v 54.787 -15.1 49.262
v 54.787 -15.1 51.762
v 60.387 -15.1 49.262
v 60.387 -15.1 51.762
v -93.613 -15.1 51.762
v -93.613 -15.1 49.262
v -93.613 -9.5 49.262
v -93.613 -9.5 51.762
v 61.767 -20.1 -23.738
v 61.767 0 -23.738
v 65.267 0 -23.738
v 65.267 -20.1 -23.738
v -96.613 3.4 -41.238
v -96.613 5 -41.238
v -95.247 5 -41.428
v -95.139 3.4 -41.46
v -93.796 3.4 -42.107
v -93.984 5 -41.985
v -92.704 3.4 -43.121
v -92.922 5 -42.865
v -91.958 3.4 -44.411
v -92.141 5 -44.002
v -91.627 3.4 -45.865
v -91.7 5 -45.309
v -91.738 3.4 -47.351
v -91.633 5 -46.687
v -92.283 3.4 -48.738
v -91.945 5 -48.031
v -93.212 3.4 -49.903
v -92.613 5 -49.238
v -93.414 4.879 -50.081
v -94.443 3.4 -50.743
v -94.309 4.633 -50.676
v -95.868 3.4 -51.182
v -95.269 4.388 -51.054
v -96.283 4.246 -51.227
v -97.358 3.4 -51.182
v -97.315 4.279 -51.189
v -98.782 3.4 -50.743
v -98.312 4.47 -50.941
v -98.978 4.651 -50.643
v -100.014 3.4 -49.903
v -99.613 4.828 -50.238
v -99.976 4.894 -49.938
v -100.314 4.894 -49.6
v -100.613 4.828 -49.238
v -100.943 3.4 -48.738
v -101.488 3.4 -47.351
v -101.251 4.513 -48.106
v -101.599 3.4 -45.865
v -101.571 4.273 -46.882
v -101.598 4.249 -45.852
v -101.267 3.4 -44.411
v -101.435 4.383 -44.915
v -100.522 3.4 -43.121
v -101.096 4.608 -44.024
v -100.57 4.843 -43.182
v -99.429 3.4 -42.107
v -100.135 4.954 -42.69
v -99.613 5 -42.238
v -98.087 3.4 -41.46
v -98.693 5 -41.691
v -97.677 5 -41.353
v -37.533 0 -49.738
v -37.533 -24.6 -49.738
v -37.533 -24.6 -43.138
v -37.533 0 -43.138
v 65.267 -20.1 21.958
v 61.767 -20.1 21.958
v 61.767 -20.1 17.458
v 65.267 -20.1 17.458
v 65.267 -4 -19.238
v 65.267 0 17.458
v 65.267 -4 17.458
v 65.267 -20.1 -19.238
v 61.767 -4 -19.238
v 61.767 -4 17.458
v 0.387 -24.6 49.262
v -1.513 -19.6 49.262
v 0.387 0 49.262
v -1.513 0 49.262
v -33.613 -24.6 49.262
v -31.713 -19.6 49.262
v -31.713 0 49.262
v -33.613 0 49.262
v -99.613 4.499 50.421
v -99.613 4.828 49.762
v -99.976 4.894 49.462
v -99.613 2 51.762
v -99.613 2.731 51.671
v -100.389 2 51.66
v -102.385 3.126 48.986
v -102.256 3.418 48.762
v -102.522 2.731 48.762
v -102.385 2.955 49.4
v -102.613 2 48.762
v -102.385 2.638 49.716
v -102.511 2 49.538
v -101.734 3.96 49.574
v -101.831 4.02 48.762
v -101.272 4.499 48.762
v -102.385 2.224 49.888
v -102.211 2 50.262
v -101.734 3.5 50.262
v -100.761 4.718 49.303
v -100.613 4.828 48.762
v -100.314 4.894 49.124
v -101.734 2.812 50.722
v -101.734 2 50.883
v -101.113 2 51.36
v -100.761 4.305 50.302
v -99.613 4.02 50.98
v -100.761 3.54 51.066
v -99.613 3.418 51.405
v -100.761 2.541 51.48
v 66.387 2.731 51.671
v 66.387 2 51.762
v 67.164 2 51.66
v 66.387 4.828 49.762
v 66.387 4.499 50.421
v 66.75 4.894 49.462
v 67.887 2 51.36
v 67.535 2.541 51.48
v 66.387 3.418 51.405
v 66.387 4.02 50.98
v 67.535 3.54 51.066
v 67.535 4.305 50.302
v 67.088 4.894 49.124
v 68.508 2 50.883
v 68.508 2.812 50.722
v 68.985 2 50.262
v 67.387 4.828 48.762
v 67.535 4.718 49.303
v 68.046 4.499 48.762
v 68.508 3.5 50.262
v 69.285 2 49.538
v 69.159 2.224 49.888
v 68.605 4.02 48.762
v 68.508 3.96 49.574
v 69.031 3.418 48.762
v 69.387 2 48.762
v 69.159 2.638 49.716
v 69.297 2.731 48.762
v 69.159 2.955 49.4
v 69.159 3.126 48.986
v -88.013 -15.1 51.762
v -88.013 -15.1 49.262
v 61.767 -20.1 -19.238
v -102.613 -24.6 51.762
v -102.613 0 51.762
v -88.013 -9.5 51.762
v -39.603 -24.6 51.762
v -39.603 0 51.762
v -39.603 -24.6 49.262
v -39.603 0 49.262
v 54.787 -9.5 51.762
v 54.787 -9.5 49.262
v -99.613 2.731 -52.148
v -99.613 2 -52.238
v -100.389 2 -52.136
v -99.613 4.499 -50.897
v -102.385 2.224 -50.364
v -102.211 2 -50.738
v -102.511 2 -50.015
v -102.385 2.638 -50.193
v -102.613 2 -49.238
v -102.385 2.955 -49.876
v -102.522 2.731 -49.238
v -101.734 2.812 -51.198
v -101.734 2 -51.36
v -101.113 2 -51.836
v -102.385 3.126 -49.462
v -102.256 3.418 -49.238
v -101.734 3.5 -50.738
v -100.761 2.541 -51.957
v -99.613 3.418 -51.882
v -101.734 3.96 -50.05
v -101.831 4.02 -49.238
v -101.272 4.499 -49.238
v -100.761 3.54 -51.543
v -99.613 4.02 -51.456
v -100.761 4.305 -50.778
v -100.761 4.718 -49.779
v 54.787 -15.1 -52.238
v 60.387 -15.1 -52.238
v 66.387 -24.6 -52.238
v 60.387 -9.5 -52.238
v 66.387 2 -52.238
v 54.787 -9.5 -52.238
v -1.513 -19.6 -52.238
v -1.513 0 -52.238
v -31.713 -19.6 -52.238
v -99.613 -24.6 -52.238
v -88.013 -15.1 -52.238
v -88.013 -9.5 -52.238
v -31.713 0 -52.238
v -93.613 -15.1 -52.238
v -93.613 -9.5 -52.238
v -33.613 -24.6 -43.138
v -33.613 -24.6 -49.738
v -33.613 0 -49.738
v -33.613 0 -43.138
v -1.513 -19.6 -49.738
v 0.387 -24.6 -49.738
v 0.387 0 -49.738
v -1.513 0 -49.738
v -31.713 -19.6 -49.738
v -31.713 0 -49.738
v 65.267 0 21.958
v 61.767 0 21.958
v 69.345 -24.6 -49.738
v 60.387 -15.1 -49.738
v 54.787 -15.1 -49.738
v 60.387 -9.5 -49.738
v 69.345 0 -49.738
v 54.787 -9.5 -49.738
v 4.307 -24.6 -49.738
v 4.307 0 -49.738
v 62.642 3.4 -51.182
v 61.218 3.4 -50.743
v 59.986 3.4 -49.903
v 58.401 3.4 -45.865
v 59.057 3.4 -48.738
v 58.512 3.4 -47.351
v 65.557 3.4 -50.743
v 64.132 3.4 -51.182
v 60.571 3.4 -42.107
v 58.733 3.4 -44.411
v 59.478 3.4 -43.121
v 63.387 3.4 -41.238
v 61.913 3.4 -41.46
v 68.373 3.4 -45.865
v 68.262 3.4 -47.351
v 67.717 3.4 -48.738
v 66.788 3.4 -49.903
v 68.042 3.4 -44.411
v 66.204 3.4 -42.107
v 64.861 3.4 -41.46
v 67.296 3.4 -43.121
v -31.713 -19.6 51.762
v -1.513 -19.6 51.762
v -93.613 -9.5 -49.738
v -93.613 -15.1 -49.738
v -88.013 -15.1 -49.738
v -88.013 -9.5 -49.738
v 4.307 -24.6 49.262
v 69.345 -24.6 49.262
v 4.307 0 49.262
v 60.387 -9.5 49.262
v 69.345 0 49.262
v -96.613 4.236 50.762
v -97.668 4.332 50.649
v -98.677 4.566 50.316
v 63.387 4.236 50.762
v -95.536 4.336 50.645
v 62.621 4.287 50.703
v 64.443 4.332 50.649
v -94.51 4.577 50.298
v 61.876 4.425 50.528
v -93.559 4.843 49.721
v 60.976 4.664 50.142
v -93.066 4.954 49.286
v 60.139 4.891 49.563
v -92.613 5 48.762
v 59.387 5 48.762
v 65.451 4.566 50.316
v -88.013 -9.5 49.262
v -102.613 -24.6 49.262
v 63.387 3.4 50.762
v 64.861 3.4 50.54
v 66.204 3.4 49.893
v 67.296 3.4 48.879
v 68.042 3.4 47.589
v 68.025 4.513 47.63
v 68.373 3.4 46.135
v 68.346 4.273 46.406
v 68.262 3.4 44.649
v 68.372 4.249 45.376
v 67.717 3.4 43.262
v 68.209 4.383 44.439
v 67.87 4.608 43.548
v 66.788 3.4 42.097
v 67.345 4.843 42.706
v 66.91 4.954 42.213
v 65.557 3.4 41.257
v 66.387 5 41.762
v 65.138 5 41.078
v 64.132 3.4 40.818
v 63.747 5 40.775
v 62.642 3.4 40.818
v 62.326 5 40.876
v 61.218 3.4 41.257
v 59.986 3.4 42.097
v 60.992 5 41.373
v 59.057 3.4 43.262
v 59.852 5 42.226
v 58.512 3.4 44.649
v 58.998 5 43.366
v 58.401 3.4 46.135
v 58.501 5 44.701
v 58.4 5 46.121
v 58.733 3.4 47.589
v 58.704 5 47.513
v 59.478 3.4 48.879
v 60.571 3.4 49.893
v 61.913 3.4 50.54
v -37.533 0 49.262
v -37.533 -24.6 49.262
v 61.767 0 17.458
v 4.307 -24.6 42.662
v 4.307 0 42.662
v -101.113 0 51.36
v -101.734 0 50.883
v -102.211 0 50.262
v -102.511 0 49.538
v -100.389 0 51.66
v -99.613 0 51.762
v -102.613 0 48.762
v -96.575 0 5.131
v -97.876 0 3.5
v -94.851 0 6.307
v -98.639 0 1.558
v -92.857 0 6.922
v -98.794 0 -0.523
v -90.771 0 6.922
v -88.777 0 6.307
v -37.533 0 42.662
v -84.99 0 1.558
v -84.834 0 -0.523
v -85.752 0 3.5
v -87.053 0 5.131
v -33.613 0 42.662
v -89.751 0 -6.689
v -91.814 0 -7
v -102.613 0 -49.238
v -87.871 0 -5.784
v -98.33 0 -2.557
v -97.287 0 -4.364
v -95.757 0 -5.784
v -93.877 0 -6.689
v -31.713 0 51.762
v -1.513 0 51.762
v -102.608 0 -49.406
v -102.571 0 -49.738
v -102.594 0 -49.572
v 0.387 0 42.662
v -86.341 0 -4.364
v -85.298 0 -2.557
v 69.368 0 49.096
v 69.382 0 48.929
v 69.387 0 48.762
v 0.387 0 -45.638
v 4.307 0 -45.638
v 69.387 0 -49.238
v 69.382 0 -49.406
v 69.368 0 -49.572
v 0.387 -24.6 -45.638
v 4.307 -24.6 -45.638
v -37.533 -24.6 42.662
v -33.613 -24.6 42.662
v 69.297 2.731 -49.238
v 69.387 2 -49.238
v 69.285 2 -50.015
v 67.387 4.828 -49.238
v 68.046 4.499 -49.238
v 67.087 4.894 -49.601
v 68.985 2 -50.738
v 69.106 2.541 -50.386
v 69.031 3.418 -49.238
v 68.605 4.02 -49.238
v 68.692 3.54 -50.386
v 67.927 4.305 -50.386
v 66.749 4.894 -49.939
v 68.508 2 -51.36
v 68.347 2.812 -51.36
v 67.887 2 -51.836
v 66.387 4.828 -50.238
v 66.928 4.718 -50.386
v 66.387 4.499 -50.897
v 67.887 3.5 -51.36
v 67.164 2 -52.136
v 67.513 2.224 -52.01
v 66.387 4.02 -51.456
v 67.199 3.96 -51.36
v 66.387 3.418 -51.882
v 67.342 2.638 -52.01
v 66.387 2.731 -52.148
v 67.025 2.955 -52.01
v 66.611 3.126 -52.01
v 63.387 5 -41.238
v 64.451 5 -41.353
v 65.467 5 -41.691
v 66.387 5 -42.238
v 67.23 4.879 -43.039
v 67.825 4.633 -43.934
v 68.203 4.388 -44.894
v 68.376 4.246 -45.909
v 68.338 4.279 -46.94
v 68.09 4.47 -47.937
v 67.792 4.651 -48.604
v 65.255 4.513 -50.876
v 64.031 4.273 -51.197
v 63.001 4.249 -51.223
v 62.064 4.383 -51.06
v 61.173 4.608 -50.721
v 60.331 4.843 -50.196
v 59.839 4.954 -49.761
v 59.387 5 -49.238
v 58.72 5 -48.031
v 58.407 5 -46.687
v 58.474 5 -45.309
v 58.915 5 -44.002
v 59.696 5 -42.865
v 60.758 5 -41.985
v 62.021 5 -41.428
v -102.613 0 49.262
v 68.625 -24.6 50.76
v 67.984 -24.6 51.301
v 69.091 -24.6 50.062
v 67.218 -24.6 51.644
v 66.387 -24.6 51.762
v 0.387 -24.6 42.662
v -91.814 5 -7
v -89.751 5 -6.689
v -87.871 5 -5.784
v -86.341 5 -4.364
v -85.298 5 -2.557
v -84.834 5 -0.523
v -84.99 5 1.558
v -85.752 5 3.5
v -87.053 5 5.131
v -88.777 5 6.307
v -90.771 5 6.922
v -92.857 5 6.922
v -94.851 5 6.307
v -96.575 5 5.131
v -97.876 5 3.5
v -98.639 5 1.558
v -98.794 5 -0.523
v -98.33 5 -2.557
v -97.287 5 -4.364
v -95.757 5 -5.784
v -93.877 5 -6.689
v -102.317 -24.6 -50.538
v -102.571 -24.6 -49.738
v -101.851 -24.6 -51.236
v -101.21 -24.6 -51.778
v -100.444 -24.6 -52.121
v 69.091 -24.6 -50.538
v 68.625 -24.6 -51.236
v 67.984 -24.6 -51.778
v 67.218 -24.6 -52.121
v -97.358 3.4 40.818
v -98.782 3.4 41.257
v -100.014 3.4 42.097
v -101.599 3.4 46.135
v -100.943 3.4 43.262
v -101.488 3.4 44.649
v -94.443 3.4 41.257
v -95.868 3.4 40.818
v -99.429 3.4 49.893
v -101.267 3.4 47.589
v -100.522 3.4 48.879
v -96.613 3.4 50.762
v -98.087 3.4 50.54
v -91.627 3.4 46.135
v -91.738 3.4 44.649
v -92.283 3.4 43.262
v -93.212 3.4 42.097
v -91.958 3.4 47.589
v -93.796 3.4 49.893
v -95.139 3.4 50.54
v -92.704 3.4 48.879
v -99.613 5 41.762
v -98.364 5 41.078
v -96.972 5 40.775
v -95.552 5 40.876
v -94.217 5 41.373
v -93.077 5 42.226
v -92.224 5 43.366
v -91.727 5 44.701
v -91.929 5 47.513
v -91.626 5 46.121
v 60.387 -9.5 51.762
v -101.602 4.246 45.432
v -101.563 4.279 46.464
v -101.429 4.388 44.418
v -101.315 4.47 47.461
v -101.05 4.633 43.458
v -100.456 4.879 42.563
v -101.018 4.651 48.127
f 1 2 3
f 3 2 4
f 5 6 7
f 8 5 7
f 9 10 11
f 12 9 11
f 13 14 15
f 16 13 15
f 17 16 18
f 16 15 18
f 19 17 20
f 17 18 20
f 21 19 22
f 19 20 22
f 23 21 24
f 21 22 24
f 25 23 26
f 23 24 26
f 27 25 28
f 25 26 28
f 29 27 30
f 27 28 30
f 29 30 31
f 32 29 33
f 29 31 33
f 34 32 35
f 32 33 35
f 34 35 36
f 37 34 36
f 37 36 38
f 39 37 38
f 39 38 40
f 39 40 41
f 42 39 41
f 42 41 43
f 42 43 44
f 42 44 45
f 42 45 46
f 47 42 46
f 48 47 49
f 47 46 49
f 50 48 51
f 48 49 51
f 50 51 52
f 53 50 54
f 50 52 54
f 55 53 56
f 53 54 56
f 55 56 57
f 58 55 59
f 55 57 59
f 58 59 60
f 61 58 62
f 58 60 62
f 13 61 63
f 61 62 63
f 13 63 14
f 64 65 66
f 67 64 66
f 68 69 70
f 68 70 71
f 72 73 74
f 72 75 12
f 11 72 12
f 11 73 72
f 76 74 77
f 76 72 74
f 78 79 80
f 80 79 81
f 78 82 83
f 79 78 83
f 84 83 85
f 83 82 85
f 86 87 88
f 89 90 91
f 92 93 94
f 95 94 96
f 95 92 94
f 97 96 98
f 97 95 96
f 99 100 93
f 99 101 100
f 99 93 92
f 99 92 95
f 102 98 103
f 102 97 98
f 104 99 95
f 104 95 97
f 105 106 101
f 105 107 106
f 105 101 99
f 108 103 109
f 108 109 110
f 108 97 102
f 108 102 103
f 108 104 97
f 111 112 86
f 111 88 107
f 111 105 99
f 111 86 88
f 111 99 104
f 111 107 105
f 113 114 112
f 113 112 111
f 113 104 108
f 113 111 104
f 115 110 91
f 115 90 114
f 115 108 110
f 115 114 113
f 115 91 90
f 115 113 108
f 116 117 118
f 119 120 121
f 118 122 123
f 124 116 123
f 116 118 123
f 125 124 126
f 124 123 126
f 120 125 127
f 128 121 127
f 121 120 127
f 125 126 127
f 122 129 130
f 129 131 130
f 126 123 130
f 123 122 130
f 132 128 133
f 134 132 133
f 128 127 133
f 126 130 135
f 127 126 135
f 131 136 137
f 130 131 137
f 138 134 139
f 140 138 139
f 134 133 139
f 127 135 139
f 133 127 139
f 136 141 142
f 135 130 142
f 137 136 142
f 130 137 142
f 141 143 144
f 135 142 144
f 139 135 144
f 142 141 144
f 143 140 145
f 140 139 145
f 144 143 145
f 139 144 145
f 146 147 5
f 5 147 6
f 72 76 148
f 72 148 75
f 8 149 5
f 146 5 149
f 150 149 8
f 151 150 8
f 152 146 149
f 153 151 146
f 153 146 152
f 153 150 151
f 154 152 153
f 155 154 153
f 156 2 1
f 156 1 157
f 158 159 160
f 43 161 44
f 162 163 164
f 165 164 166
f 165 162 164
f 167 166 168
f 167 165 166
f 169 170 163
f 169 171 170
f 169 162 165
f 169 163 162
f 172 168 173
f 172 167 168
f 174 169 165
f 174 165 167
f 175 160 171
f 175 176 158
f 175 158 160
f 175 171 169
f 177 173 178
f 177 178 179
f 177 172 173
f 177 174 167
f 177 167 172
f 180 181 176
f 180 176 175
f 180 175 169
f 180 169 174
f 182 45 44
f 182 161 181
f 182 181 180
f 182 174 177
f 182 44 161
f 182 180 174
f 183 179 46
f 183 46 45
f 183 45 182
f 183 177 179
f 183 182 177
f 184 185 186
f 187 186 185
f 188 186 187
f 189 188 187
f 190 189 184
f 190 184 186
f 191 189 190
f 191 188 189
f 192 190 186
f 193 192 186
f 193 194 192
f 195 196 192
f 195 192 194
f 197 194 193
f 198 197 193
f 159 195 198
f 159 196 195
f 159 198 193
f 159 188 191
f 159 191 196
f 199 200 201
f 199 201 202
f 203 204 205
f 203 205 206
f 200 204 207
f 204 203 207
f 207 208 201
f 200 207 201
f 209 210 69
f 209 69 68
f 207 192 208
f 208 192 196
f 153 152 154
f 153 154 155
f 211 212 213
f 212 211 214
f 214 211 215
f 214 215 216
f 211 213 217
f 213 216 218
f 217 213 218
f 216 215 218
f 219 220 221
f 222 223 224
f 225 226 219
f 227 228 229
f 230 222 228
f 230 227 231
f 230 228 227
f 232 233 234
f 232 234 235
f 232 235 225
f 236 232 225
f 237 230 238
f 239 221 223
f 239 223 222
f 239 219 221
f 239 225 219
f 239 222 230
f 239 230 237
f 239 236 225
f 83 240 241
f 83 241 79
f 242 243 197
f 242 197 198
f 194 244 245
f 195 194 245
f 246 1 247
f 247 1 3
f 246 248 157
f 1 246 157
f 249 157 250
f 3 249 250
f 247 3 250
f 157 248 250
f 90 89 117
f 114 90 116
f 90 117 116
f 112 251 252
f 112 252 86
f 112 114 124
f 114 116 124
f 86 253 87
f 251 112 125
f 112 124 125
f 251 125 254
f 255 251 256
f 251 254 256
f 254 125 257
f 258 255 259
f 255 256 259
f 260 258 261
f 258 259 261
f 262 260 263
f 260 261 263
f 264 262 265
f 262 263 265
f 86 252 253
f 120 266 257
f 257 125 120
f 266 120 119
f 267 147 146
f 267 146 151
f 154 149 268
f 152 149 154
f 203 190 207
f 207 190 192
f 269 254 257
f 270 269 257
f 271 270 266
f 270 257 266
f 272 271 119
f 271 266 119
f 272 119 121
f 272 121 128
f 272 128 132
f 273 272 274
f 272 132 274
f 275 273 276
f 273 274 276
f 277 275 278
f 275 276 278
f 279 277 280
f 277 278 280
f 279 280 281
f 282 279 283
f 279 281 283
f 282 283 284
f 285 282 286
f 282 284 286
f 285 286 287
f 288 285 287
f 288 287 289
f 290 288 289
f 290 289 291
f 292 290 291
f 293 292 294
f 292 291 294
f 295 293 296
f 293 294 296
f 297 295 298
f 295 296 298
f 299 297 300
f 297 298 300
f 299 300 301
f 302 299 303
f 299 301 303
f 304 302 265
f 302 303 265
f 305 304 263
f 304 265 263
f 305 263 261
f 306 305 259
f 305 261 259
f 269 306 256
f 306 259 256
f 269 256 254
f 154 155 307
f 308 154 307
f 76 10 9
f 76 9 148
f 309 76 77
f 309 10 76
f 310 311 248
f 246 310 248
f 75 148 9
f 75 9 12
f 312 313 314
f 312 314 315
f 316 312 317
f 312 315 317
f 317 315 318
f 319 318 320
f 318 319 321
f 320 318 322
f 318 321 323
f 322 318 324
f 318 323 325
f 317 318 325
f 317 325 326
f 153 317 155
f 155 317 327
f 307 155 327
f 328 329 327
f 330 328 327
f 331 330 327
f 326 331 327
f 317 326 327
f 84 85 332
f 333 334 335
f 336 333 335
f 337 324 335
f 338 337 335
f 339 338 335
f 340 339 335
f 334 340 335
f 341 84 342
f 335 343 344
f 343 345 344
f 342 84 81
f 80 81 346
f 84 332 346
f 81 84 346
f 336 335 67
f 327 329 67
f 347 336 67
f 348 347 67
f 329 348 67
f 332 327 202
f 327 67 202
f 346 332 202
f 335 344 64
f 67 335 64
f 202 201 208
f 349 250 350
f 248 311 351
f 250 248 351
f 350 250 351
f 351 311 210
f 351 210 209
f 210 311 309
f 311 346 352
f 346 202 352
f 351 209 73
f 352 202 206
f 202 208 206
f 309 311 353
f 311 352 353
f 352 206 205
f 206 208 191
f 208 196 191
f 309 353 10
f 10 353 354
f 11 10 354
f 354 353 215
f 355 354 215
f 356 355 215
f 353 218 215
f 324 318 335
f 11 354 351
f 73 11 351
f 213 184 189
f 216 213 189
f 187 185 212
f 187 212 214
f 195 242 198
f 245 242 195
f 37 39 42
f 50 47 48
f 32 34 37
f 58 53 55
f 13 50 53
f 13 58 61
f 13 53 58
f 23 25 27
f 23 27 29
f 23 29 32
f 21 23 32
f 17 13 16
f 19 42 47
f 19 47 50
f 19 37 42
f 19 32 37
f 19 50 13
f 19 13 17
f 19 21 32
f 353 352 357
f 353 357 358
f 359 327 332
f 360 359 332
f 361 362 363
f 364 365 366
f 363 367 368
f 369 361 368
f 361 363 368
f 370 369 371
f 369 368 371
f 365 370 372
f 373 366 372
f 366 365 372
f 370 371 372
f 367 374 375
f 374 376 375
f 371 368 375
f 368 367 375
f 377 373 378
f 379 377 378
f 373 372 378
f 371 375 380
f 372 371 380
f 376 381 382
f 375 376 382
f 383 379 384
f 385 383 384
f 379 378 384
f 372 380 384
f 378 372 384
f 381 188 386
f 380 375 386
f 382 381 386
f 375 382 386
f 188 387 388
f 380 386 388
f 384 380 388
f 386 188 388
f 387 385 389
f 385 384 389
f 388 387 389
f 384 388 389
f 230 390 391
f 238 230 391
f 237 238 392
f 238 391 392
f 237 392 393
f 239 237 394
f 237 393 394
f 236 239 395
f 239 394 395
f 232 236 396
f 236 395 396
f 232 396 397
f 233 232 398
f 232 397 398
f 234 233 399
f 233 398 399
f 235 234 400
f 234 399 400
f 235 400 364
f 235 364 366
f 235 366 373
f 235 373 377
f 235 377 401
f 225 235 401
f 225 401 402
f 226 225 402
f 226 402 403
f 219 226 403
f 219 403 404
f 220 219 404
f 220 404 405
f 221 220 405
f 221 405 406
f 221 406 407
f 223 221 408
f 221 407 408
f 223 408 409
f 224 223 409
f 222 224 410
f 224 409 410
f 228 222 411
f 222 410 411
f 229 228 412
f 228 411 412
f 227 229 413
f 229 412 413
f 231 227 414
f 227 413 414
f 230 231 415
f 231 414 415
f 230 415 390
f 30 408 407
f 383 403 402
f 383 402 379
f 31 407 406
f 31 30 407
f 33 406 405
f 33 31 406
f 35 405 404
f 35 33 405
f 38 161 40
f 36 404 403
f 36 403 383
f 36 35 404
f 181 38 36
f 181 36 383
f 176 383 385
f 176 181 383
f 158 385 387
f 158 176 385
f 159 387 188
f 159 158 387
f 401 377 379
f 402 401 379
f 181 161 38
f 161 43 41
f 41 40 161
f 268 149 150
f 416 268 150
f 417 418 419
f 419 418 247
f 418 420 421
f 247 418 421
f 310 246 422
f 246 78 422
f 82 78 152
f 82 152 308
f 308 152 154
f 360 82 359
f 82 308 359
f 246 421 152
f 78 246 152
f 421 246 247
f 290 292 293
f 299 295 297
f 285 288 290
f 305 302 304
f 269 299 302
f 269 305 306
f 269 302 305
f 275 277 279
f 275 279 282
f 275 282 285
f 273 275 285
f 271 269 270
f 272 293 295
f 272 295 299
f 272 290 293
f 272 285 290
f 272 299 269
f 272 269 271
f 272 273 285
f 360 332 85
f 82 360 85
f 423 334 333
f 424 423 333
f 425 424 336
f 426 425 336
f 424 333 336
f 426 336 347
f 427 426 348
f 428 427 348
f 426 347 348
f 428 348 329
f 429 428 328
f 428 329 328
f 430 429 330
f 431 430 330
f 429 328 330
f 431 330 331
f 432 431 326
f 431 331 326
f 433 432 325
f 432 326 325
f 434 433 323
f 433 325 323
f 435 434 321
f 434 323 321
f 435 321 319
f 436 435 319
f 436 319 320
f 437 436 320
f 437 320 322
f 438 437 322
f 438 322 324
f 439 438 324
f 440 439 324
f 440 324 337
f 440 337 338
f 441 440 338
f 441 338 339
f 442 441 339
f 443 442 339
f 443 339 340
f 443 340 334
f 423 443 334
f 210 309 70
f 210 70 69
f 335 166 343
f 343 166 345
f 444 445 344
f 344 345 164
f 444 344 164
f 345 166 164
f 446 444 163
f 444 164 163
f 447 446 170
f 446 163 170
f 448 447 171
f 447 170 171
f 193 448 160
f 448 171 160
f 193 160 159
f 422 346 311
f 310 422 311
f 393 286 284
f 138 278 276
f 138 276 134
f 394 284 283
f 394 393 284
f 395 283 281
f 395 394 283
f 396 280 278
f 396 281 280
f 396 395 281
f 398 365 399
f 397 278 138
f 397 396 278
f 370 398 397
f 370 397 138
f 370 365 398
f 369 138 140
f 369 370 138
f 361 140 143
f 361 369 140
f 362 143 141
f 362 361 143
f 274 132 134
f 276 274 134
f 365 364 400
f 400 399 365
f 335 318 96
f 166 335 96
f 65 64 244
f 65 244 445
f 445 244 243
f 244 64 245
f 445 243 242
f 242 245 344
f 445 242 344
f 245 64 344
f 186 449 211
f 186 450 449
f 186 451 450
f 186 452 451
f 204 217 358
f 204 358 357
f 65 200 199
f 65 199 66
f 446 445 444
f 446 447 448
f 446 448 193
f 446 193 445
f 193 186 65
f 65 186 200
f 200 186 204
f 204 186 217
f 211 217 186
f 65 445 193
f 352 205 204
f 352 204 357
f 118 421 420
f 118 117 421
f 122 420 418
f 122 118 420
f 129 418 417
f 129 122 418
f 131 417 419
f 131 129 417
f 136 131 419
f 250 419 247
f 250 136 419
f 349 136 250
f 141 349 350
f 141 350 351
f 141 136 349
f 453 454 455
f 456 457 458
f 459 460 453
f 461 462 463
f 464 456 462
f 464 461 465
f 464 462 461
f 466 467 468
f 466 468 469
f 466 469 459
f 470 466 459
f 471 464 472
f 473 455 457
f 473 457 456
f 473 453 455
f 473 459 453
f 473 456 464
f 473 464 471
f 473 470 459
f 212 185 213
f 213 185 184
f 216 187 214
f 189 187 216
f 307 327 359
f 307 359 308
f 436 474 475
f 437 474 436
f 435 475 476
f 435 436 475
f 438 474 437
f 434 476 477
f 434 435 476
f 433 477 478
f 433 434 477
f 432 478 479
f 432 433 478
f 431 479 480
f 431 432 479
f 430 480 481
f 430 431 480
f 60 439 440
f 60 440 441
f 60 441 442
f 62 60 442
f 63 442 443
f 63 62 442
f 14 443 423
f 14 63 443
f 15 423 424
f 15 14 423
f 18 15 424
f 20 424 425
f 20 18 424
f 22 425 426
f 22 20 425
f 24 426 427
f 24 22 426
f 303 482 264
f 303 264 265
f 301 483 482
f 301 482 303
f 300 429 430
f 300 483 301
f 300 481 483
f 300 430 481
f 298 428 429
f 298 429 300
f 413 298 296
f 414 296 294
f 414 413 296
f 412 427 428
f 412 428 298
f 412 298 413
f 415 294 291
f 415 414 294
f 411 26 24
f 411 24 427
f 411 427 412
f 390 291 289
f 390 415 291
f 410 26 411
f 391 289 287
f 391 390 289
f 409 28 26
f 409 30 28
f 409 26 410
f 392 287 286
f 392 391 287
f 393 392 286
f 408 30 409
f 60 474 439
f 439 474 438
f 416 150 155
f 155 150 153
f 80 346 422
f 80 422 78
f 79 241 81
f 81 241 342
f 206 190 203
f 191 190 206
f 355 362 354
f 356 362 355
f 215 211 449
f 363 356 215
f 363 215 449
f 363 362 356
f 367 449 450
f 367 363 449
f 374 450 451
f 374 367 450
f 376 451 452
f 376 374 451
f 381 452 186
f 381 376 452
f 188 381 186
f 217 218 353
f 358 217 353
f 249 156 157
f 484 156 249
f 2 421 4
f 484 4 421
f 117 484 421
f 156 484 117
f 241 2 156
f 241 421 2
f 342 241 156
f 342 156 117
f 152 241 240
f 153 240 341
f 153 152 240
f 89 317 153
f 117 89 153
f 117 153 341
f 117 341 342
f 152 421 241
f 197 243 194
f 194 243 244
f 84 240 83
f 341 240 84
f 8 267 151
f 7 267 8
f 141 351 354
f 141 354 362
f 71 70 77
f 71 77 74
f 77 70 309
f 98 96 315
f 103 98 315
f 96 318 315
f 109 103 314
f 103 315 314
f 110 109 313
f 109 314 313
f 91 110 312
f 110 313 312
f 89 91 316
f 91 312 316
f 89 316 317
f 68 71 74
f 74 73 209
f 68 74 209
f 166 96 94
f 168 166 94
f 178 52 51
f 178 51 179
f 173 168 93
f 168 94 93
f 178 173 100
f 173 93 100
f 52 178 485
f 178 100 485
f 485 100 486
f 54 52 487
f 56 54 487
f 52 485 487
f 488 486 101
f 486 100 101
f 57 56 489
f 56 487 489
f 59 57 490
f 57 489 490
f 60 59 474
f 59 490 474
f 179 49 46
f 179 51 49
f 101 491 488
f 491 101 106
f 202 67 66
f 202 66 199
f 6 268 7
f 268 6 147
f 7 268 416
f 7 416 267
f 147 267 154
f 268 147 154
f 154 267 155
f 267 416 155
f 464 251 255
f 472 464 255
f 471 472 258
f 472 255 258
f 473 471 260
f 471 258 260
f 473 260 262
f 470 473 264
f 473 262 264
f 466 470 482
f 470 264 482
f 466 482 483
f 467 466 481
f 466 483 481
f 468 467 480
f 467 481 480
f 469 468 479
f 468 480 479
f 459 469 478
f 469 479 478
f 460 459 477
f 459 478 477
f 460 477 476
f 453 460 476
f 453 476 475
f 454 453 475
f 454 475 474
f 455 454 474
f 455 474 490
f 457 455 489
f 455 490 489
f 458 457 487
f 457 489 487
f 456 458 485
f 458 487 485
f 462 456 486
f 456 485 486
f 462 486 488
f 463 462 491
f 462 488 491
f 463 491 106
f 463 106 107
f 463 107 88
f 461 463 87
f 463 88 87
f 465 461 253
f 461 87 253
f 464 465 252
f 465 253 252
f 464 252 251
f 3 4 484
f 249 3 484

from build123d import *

# Parameters (mm, degrees)
ESBO_O1_W                 = 172
ESBO_O1_H                 = 104
RESSALTO_EXTRUS_O1_DEPTH  = 5
ESBO_O6_W                 = 63.01
ESBO_O6_H                 = 24.6
RESSALTO_EXTRUS_O3_DEPTH  = 2.5
ESBO_O9_W                 = 5.6
ESBO_O9_H                 = 5.6
CORTE_EXTRUS_O1_DEPTH     = 5
ESBO_O10_W                = 63
ESBO_O10_H                = 24.6
RESSALTO_EXTRUS_O4_DEPTH  = 2.5
ESBO_O11_W                = 5.6
ESBO_O11_H                = 5.6
CORTE_EXTRUS_O2_DEPTH     = 5
ESBO_O12_W                = 63
ESBO_O12_H                = 24.6
RESSALTO_EXTRUS_O5_DEPTH  = 2.5
ESBO_O15_W                = 63
ESBO_O15_H                = 24.6
RESSALTO_EXTRUS_O6_DEPTH  = 2.5
ESBO_O18_W                = 5.6
ESBO_O18_H                = 5.6
CORTE_EXTRUS_O5_DEPTH     = 10
ESBO_O19_W                = 5.6
ESBO_O19_H                = 5.6
CORTE_EXTRUS_O6_DEPTH     = 10
ESBO_O20_W                = 7.9
ESBO_O20_H                = 24.6
RESSALTO_EXTRUS_O7_DEPTH  = 2.5
ESBO_O21_W                = 7.89
ESBO_O21_H                = 24.6
RESSALTO_EXTRUS_O8_DEPTH  = 2.5
ESBO_O25_W                = 3.92
ESBO_O25_H                = 6.6
RESSALTO_EXTRUS_O9_DEPTH  = 24.6
ESBO_O27_W                = 3.92
ESBO_O27_H                = 6.6
RESSALTO_EXTRUS_O10_DEPTH = 24.6
ESBO_O28_W                = 2.5
ESBO_O28_H                = 5
RESSALTO_EXTRUS_O11_DEPTH = 30.6
ESBO_O29_W                = 7.9
ESBO_O29_H                = 24.6
RESSALTO_EXTRUS_O12_DEPTH = 2.5
ESBO_O30_W                = 7.9
ESBO_O30_H                = 24.6
RESSALTO_EXTRUS_O13_DEPTH = 2.5
ESBO_O31_W                = 3.92
ESBO_O31_H                = 6.6
RESSALTO_EXTRUS_O14_DEPTH = 24.6
ESBO_O32_W                = 3.92
ESBO_O32_H                = 4.1
RESSALTO_EXTRUS_O15_DEPTH = 24.6
ESBO_O34_W                = 30.2
ESBO_O34_H                = 5
RESSALTO_EXTRUS_O16_DEPTH = 2.5
FILETE3_R                 = 3
FILETE4_R                 = 3
FILETE5_R                 = 3
FILETE6_R                 = 3
ESBO_O53_R                = 7
CORTE_EXTRUS_O12_DEPTH    = 134
ESBO_O55_W                = 3.5
ESBO_O55_H                = 4.5
RESSALTO_EXTRUS_O29_DEPTH = 20.1
ESBO_O57_W                = 3.5
ESBO_O57_H                = 4.5
RESSALTO_EXTRUS_O30_DEPTH = 20.1
ESBO_O58_W                = 3.5
ESBO_O58_H                = 36.697857
RESSALTO_EXTRUS_O31_DEPTH = 4
ESBO_O49_R                = 5
CORTE_EXTRUS_O13_DEPTH    = 1.6
ESBO_O47_R                = 5
CORTE_EXTRUS_O14_DEPTH    = 1.6
ESBO_O44_R                = 5
CORTE_EXTRUS_O15_DEPTH    = 1.6
ESBO_O48_R                = 5
CORTE_EXTRUS_O16_DEPTH    = 1.6


with BuildPart() as part:
    # Esboço1 → Ressalto-extrusão1 (new body)
    with BuildSketch(Plane(origin=(0, 0, 0), x_dir=(1, 0, 0), z_dir=(0, 1, 0))):
        with Locations((-16.61286323, 0.238185856)):
            Rectangle(ESBO_O1_W, ESBO_O1_H)
    extrude(amount=RESSALTO_EXTRUS_O1_DEPTH)



with BuildPart() as body_2:
    # Esboço6 → Ressalto-extrusão3 (new body)
    with BuildSketch(Plane.XY.offset(51.761814144)):
        with Locations((-71.10786323, -12.3)):
            Rectangle(ESBO_O6_W, ESBO_O6_H)
    extrude(amount=-RESSALTO_EXTRUS_O3_DEPTH)

    # Esboço9 → Corte-extrusão1 (cut)
    with BuildSketch(Plane(origin=(0, 0, 49.261814144), x_dir=(-1, 0, 0), z_dir=(0, 0, -1))):
        with Locations((90.81286323, -12.3)):
            Rectangle(ESBO_O9_W, ESBO_O9_H)
    extrude(amount=-CORTE_EXTRUS_O1_DEPTH, mode=Mode.SUBTRACT)


with BuildPart() as body_3:
    # Esboço10 → Ressalto-extrusão4 (new body)
    with BuildSketch(Plane(origin=(0, 0, -52.238185856), x_dir=(-1, 0, 0), z_dir=(0, 0, -1))):
        with Locations((71.11286323, -12.3)):
            Rectangle(ESBO_O10_W, ESBO_O10_H)
    extrude(amount=-RESSALTO_EXTRUS_O4_DEPTH)

    # Esboço11 → Corte-extrusão2 (cut)
    with BuildSketch(Plane.XY.offset(-49.738185856)):
        with Locations((-90.81286323, -12.3)):
            Rectangle(ESBO_O11_W, ESBO_O11_H)
    extrude(amount=-CORTE_EXTRUS_O2_DEPTH, mode=Mode.SUBTRACT)


with BuildPart() as body_4:
    # Esboço12 → Ressalto-extrusão5 (new body)
    with BuildSketch(Plane(origin=(0, 0, -52.238185856), x_dir=(-1, 0, 0), z_dir=(0, 0, -1))):
        with Locations((-37.88713677, -12.3)):
            Rectangle(ESBO_O12_W, ESBO_O12_H)
    extrude(amount=-RESSALTO_EXTRUS_O5_DEPTH)

    # Esboço18 → Corte-extrusão5 (cut)
    with BuildSketch(Plane(origin=(0, 0, -52.238185856), x_dir=(-1, 0, 0), z_dir=(0, 0, -1))):
        with Locations((-57.58713677, -12.3)):
            Rectangle(ESBO_O18_W, ESBO_O18_H)
    extrude(amount=-CORTE_EXTRUS_O5_DEPTH, mode=Mode.SUBTRACT)


with BuildPart() as body_5:
    # Esboço15 → Ressalto-extrusão6 (new body)
    with BuildSketch(Plane.XY.offset(51.761814144)):
        with Locations((37.88713677, -12.3)):
            Rectangle(ESBO_O15_W, ESBO_O15_H)
    extrude(amount=-RESSALTO_EXTRUS_O6_DEPTH)

    # Esboço19 → Corte-extrusão6 (cut)
    with BuildSketch(Plane.XY.offset(51.761814144)):
        with Locations((57.58713677, -12.3)):
            Rectangle(ESBO_O19_W, ESBO_O19_H)
    extrude(amount=-CORTE_EXTRUS_O6_DEPTH, mode=Mode.SUBTRACT)


with BuildPart() as part_1:
    add(part.part)

    add(body_5.part)  # Ressalto-extrusão7 merges body 5
    # Esboço20 → Ressalto-extrusão7 (add)
    with BuildSketch(Plane.XY.offset(51.761814144)):
        with Locations((2.43713677, -12.3)):
            Rectangle(ESBO_O20_W, ESBO_O20_H)
    extrude(amount=-RESSALTO_EXTRUS_O7_DEPTH)

    # Esboço25 → Ressalto-extrusão9 (add)
    with BuildSketch(Plane.XZ):
        with Locations((2.34713677, 45.961814144)):
            Rectangle(ESBO_O25_W, ESBO_O25_H)
    extrude(amount=RESSALTO_EXTRUS_O9_DEPTH)



with BuildPart() as body_5_2:
    # Esboço21 → Ressalto-extrusão8 (new body)
    with BuildSketch(Plane.XY.offset(51.761814144)):
        with Locations((-35.65786323, -12.3)):
            Rectangle(ESBO_O21_W, ESBO_O21_H)
    extrude(amount=-RESSALTO_EXTRUS_O8_DEPTH)


with BuildPart() as part_2:
    add(part_1.part)

    add(body_5_2.part)  # Ressalto-extrusão10 merges body 5 2
    # Esboço27 → Ressalto-extrusão10 (add)
    with BuildSketch(Plane.XZ):
        with Locations((-35.57286323, 45.961814144)):
            Rectangle(ESBO_O27_W, ESBO_O27_H)
    extrude(amount=RESSALTO_EXTRUS_O10_DEPTH)

    # Esboço28 → Ressalto-extrusão11 (add)
    with BuildSketch(Plane(origin=(-31.71286323, 0, 0), x_dir=(0, 0, -1), z_dir=(1, 0, 0))):
        with Locations((-50.511814144, -22.1)):
            Rectangle(ESBO_O28_W, ESBO_O28_H)
    extrude(amount=RESSALTO_EXTRUS_O11_DEPTH)


    add(body_3.part)  # Ressalto-extrusão12 merges body 3
    # Esboço29 → Ressalto-extrusão12 (add)
    with BuildSketch(Plane(origin=(0, 0, -52.238185856), x_dir=(-1, 0, 0), z_dir=(0, 0, -1))):
        with Locations((35.66286323, -12.3)):
            Rectangle(ESBO_O29_W, ESBO_O29_H)
    extrude(amount=-RESSALTO_EXTRUS_O12_DEPTH)


    add(body_4.part)  # Ressalto-extrusão13 merges body 4
    # Esboço30 → Ressalto-extrusão13 (add)
    with BuildSketch(Plane(origin=(0, 0, -52.238185856), x_dir=(-1, 0, 0), z_dir=(0, 0, -1))):
        with Locations((-2.43713677, -12.3)):
            Rectangle(ESBO_O30_W, ESBO_O30_H)
    extrude(amount=-RESSALTO_EXTRUS_O13_DEPTH)

    # Esboço31 → Ressalto-extrusão14 (add)
    with BuildSketch(Plane.XZ):
        with Locations((-35.57286323, -46.438185856)):
            Rectangle(ESBO_O31_W, ESBO_O31_H)
    extrude(amount=RESSALTO_EXTRUS_O14_DEPTH)

    # Esboço32 → Ressalto-extrusão15 (add)
    with BuildSketch(Plane.XZ):
        with Locations((2.34713677, -47.688185856)):
            Rectangle(ESBO_O32_W, ESBO_O32_H)
    extrude(amount=RESSALTO_EXTRUS_O15_DEPTH)

    # Esboço34 → Ressalto-extrusão16 (add)
    with BuildSketch(Plane(origin=(0, 0, -52.238185856), x_dir=(-1, 0, 0), z_dir=(0, 0, -1))):
        with Locations((16.61286323, -22.1)):
            Rectangle(ESBO_O34_W, ESBO_O34_H)
    extrude(amount=-RESSALTO_EXTRUS_O16_DEPTH)

    # Filete3
    filete3_edges = [part_2.edges().sort_by_distance(p)[0] for p in [
        (-16.61286323, 5, 51.761814144),
    ]]
    fillet(filete3_edges, radius=FILETE3_R)

    # Filete4
    filete4_edges = [part_2.edges().sort_by_distance(p)[0] for p in [
        (69.38713677, -11.3, 51.761814144),
        (69.38713677, 4.121320344, 50.883134488),
        (69.38713677, 5, -1.738185856),
    ]]
    fillet(filete4_edges, radius=FILETE4_R)

    # Filete5
    filete5_edges = [part_2.edges().sort_by_distance(p)[0] for p in [
        (69.38713677, -11.3, -52.238185856),
        (68.508457113, 4.121320344, -52.238185856),
        (-18.11286323, 5, -52.238185856),
    ]]
    fillet(filete5_edges, radius=FILETE5_R)

    # Filete6
    filete6_edges = [part_2.edges().sort_by_distance(p)[0] for p in [
        (-102.61286323, -11.3, -52.238185856),
        (-102.61286323, 4.121320344, -51.359506199),
        (-102.61286323, 1, 51.761814144),
        (-102.61286323, 4.121320344, 50.883134488),
        (-102.61286323, 5, -0.238185856),
    ]]
    fillet(filete6_edges, radius=FILETE6_R)

    # Esboço53 → Corte-extrusão12 (cut)
    with BuildSketch(Plane.XZ):
        with Locations(Location((-91.814067068, 0, 0), (0, 0, 270))):
            Circle(ESBO_O53_R)
    extrude(amount=-CORTE_EXTRUS_O12_DEPTH, mode=Mode.SUBTRACT)

    # Esboço55 → Ressalto-extrusão29 (add)
    with BuildSketch(Plane.XZ):
        with Locations((63.516746102, 19.708050032)):
            Rectangle(ESBO_O55_W, ESBO_O55_H)
    extrude(amount=RESSALTO_EXTRUS_O29_DEPTH)

    # Esboço57 → Ressalto-extrusão30 (add)
    with BuildSketch(Plane.XZ):
        with Locations((63.51713677, -21.488185856)):
            Rectangle(ESBO_O57_W, ESBO_O57_H)
    extrude(amount=RESSALTO_EXTRUS_O30_DEPTH)

    # Esboço58 → Ressalto-extrusão31 (add)
    with BuildSketch(Plane(origin=(0, 0, 0), x_dir=(-1, 0, 0), z_dir=(0, -1, 0))):
        with Locations((-63.51713677, 0.890878468)):
            Rectangle(ESBO_O58_W, ESBO_O58_H)
    extrude(amount=RESSALTO_EXTRUS_O31_DEPTH)

    # Esboço49 → Corte-extrusão13 (cut)
    with BuildSketch(Plane(origin=(0, 5, 0), x_dir=(1, 0, 0), z_dir=(0, 1, 0))):
        with Locations(Location((63.38713677, 46.238185856, 0), (0, 0, 270))):
            Circle(ESBO_O49_R)
    extrude(amount=-CORTE_EXTRUS_O13_DEPTH, mode=Mode.SUBTRACT)

    # Esboço47 → Corte-extrusão14 (cut)
    with BuildSketch(Plane(origin=(0, 5, 0), x_dir=(1, 0, 0), z_dir=(0, 1, 0))):
        with Locations(Location((-96.61286323, 46.238185856, 0), (0, 0, 270))):
            Circle(ESBO_O47_R)
    extrude(amount=-CORTE_EXTRUS_O14_DEPTH, mode=Mode.SUBTRACT)

    # Esboço44 → Corte-extrusão15 (cut)
    with BuildSketch(Plane(origin=(0, 5, 0), x_dir=(1, 0, 0), z_dir=(0, 1, 0))):
        with Locations(Location((-96.61286323, -45.761814144, 0), (0, 0, 270))):
            Circle(ESBO_O44_R)
    extrude(amount=-CORTE_EXTRUS_O15_DEPTH, mode=Mode.SUBTRACT)

    # Esboço48 → Corte-extrusão16 (cut)
    with BuildSketch(Plane(origin=(0, 5, 0), x_dir=(1, 0, 0), z_dir=(0, 1, 0))):
        with Locations(Location((63.38713677, -45.761814144, 0), (0, 0, 270))):
            Circle(ESBO_O48_R)
    extrude(amount=-CORTE_EXTRUS_O16_DEPTH, mode=Mode.SUBTRACT)


solid = Compound([body_2.part, part_2.part])
